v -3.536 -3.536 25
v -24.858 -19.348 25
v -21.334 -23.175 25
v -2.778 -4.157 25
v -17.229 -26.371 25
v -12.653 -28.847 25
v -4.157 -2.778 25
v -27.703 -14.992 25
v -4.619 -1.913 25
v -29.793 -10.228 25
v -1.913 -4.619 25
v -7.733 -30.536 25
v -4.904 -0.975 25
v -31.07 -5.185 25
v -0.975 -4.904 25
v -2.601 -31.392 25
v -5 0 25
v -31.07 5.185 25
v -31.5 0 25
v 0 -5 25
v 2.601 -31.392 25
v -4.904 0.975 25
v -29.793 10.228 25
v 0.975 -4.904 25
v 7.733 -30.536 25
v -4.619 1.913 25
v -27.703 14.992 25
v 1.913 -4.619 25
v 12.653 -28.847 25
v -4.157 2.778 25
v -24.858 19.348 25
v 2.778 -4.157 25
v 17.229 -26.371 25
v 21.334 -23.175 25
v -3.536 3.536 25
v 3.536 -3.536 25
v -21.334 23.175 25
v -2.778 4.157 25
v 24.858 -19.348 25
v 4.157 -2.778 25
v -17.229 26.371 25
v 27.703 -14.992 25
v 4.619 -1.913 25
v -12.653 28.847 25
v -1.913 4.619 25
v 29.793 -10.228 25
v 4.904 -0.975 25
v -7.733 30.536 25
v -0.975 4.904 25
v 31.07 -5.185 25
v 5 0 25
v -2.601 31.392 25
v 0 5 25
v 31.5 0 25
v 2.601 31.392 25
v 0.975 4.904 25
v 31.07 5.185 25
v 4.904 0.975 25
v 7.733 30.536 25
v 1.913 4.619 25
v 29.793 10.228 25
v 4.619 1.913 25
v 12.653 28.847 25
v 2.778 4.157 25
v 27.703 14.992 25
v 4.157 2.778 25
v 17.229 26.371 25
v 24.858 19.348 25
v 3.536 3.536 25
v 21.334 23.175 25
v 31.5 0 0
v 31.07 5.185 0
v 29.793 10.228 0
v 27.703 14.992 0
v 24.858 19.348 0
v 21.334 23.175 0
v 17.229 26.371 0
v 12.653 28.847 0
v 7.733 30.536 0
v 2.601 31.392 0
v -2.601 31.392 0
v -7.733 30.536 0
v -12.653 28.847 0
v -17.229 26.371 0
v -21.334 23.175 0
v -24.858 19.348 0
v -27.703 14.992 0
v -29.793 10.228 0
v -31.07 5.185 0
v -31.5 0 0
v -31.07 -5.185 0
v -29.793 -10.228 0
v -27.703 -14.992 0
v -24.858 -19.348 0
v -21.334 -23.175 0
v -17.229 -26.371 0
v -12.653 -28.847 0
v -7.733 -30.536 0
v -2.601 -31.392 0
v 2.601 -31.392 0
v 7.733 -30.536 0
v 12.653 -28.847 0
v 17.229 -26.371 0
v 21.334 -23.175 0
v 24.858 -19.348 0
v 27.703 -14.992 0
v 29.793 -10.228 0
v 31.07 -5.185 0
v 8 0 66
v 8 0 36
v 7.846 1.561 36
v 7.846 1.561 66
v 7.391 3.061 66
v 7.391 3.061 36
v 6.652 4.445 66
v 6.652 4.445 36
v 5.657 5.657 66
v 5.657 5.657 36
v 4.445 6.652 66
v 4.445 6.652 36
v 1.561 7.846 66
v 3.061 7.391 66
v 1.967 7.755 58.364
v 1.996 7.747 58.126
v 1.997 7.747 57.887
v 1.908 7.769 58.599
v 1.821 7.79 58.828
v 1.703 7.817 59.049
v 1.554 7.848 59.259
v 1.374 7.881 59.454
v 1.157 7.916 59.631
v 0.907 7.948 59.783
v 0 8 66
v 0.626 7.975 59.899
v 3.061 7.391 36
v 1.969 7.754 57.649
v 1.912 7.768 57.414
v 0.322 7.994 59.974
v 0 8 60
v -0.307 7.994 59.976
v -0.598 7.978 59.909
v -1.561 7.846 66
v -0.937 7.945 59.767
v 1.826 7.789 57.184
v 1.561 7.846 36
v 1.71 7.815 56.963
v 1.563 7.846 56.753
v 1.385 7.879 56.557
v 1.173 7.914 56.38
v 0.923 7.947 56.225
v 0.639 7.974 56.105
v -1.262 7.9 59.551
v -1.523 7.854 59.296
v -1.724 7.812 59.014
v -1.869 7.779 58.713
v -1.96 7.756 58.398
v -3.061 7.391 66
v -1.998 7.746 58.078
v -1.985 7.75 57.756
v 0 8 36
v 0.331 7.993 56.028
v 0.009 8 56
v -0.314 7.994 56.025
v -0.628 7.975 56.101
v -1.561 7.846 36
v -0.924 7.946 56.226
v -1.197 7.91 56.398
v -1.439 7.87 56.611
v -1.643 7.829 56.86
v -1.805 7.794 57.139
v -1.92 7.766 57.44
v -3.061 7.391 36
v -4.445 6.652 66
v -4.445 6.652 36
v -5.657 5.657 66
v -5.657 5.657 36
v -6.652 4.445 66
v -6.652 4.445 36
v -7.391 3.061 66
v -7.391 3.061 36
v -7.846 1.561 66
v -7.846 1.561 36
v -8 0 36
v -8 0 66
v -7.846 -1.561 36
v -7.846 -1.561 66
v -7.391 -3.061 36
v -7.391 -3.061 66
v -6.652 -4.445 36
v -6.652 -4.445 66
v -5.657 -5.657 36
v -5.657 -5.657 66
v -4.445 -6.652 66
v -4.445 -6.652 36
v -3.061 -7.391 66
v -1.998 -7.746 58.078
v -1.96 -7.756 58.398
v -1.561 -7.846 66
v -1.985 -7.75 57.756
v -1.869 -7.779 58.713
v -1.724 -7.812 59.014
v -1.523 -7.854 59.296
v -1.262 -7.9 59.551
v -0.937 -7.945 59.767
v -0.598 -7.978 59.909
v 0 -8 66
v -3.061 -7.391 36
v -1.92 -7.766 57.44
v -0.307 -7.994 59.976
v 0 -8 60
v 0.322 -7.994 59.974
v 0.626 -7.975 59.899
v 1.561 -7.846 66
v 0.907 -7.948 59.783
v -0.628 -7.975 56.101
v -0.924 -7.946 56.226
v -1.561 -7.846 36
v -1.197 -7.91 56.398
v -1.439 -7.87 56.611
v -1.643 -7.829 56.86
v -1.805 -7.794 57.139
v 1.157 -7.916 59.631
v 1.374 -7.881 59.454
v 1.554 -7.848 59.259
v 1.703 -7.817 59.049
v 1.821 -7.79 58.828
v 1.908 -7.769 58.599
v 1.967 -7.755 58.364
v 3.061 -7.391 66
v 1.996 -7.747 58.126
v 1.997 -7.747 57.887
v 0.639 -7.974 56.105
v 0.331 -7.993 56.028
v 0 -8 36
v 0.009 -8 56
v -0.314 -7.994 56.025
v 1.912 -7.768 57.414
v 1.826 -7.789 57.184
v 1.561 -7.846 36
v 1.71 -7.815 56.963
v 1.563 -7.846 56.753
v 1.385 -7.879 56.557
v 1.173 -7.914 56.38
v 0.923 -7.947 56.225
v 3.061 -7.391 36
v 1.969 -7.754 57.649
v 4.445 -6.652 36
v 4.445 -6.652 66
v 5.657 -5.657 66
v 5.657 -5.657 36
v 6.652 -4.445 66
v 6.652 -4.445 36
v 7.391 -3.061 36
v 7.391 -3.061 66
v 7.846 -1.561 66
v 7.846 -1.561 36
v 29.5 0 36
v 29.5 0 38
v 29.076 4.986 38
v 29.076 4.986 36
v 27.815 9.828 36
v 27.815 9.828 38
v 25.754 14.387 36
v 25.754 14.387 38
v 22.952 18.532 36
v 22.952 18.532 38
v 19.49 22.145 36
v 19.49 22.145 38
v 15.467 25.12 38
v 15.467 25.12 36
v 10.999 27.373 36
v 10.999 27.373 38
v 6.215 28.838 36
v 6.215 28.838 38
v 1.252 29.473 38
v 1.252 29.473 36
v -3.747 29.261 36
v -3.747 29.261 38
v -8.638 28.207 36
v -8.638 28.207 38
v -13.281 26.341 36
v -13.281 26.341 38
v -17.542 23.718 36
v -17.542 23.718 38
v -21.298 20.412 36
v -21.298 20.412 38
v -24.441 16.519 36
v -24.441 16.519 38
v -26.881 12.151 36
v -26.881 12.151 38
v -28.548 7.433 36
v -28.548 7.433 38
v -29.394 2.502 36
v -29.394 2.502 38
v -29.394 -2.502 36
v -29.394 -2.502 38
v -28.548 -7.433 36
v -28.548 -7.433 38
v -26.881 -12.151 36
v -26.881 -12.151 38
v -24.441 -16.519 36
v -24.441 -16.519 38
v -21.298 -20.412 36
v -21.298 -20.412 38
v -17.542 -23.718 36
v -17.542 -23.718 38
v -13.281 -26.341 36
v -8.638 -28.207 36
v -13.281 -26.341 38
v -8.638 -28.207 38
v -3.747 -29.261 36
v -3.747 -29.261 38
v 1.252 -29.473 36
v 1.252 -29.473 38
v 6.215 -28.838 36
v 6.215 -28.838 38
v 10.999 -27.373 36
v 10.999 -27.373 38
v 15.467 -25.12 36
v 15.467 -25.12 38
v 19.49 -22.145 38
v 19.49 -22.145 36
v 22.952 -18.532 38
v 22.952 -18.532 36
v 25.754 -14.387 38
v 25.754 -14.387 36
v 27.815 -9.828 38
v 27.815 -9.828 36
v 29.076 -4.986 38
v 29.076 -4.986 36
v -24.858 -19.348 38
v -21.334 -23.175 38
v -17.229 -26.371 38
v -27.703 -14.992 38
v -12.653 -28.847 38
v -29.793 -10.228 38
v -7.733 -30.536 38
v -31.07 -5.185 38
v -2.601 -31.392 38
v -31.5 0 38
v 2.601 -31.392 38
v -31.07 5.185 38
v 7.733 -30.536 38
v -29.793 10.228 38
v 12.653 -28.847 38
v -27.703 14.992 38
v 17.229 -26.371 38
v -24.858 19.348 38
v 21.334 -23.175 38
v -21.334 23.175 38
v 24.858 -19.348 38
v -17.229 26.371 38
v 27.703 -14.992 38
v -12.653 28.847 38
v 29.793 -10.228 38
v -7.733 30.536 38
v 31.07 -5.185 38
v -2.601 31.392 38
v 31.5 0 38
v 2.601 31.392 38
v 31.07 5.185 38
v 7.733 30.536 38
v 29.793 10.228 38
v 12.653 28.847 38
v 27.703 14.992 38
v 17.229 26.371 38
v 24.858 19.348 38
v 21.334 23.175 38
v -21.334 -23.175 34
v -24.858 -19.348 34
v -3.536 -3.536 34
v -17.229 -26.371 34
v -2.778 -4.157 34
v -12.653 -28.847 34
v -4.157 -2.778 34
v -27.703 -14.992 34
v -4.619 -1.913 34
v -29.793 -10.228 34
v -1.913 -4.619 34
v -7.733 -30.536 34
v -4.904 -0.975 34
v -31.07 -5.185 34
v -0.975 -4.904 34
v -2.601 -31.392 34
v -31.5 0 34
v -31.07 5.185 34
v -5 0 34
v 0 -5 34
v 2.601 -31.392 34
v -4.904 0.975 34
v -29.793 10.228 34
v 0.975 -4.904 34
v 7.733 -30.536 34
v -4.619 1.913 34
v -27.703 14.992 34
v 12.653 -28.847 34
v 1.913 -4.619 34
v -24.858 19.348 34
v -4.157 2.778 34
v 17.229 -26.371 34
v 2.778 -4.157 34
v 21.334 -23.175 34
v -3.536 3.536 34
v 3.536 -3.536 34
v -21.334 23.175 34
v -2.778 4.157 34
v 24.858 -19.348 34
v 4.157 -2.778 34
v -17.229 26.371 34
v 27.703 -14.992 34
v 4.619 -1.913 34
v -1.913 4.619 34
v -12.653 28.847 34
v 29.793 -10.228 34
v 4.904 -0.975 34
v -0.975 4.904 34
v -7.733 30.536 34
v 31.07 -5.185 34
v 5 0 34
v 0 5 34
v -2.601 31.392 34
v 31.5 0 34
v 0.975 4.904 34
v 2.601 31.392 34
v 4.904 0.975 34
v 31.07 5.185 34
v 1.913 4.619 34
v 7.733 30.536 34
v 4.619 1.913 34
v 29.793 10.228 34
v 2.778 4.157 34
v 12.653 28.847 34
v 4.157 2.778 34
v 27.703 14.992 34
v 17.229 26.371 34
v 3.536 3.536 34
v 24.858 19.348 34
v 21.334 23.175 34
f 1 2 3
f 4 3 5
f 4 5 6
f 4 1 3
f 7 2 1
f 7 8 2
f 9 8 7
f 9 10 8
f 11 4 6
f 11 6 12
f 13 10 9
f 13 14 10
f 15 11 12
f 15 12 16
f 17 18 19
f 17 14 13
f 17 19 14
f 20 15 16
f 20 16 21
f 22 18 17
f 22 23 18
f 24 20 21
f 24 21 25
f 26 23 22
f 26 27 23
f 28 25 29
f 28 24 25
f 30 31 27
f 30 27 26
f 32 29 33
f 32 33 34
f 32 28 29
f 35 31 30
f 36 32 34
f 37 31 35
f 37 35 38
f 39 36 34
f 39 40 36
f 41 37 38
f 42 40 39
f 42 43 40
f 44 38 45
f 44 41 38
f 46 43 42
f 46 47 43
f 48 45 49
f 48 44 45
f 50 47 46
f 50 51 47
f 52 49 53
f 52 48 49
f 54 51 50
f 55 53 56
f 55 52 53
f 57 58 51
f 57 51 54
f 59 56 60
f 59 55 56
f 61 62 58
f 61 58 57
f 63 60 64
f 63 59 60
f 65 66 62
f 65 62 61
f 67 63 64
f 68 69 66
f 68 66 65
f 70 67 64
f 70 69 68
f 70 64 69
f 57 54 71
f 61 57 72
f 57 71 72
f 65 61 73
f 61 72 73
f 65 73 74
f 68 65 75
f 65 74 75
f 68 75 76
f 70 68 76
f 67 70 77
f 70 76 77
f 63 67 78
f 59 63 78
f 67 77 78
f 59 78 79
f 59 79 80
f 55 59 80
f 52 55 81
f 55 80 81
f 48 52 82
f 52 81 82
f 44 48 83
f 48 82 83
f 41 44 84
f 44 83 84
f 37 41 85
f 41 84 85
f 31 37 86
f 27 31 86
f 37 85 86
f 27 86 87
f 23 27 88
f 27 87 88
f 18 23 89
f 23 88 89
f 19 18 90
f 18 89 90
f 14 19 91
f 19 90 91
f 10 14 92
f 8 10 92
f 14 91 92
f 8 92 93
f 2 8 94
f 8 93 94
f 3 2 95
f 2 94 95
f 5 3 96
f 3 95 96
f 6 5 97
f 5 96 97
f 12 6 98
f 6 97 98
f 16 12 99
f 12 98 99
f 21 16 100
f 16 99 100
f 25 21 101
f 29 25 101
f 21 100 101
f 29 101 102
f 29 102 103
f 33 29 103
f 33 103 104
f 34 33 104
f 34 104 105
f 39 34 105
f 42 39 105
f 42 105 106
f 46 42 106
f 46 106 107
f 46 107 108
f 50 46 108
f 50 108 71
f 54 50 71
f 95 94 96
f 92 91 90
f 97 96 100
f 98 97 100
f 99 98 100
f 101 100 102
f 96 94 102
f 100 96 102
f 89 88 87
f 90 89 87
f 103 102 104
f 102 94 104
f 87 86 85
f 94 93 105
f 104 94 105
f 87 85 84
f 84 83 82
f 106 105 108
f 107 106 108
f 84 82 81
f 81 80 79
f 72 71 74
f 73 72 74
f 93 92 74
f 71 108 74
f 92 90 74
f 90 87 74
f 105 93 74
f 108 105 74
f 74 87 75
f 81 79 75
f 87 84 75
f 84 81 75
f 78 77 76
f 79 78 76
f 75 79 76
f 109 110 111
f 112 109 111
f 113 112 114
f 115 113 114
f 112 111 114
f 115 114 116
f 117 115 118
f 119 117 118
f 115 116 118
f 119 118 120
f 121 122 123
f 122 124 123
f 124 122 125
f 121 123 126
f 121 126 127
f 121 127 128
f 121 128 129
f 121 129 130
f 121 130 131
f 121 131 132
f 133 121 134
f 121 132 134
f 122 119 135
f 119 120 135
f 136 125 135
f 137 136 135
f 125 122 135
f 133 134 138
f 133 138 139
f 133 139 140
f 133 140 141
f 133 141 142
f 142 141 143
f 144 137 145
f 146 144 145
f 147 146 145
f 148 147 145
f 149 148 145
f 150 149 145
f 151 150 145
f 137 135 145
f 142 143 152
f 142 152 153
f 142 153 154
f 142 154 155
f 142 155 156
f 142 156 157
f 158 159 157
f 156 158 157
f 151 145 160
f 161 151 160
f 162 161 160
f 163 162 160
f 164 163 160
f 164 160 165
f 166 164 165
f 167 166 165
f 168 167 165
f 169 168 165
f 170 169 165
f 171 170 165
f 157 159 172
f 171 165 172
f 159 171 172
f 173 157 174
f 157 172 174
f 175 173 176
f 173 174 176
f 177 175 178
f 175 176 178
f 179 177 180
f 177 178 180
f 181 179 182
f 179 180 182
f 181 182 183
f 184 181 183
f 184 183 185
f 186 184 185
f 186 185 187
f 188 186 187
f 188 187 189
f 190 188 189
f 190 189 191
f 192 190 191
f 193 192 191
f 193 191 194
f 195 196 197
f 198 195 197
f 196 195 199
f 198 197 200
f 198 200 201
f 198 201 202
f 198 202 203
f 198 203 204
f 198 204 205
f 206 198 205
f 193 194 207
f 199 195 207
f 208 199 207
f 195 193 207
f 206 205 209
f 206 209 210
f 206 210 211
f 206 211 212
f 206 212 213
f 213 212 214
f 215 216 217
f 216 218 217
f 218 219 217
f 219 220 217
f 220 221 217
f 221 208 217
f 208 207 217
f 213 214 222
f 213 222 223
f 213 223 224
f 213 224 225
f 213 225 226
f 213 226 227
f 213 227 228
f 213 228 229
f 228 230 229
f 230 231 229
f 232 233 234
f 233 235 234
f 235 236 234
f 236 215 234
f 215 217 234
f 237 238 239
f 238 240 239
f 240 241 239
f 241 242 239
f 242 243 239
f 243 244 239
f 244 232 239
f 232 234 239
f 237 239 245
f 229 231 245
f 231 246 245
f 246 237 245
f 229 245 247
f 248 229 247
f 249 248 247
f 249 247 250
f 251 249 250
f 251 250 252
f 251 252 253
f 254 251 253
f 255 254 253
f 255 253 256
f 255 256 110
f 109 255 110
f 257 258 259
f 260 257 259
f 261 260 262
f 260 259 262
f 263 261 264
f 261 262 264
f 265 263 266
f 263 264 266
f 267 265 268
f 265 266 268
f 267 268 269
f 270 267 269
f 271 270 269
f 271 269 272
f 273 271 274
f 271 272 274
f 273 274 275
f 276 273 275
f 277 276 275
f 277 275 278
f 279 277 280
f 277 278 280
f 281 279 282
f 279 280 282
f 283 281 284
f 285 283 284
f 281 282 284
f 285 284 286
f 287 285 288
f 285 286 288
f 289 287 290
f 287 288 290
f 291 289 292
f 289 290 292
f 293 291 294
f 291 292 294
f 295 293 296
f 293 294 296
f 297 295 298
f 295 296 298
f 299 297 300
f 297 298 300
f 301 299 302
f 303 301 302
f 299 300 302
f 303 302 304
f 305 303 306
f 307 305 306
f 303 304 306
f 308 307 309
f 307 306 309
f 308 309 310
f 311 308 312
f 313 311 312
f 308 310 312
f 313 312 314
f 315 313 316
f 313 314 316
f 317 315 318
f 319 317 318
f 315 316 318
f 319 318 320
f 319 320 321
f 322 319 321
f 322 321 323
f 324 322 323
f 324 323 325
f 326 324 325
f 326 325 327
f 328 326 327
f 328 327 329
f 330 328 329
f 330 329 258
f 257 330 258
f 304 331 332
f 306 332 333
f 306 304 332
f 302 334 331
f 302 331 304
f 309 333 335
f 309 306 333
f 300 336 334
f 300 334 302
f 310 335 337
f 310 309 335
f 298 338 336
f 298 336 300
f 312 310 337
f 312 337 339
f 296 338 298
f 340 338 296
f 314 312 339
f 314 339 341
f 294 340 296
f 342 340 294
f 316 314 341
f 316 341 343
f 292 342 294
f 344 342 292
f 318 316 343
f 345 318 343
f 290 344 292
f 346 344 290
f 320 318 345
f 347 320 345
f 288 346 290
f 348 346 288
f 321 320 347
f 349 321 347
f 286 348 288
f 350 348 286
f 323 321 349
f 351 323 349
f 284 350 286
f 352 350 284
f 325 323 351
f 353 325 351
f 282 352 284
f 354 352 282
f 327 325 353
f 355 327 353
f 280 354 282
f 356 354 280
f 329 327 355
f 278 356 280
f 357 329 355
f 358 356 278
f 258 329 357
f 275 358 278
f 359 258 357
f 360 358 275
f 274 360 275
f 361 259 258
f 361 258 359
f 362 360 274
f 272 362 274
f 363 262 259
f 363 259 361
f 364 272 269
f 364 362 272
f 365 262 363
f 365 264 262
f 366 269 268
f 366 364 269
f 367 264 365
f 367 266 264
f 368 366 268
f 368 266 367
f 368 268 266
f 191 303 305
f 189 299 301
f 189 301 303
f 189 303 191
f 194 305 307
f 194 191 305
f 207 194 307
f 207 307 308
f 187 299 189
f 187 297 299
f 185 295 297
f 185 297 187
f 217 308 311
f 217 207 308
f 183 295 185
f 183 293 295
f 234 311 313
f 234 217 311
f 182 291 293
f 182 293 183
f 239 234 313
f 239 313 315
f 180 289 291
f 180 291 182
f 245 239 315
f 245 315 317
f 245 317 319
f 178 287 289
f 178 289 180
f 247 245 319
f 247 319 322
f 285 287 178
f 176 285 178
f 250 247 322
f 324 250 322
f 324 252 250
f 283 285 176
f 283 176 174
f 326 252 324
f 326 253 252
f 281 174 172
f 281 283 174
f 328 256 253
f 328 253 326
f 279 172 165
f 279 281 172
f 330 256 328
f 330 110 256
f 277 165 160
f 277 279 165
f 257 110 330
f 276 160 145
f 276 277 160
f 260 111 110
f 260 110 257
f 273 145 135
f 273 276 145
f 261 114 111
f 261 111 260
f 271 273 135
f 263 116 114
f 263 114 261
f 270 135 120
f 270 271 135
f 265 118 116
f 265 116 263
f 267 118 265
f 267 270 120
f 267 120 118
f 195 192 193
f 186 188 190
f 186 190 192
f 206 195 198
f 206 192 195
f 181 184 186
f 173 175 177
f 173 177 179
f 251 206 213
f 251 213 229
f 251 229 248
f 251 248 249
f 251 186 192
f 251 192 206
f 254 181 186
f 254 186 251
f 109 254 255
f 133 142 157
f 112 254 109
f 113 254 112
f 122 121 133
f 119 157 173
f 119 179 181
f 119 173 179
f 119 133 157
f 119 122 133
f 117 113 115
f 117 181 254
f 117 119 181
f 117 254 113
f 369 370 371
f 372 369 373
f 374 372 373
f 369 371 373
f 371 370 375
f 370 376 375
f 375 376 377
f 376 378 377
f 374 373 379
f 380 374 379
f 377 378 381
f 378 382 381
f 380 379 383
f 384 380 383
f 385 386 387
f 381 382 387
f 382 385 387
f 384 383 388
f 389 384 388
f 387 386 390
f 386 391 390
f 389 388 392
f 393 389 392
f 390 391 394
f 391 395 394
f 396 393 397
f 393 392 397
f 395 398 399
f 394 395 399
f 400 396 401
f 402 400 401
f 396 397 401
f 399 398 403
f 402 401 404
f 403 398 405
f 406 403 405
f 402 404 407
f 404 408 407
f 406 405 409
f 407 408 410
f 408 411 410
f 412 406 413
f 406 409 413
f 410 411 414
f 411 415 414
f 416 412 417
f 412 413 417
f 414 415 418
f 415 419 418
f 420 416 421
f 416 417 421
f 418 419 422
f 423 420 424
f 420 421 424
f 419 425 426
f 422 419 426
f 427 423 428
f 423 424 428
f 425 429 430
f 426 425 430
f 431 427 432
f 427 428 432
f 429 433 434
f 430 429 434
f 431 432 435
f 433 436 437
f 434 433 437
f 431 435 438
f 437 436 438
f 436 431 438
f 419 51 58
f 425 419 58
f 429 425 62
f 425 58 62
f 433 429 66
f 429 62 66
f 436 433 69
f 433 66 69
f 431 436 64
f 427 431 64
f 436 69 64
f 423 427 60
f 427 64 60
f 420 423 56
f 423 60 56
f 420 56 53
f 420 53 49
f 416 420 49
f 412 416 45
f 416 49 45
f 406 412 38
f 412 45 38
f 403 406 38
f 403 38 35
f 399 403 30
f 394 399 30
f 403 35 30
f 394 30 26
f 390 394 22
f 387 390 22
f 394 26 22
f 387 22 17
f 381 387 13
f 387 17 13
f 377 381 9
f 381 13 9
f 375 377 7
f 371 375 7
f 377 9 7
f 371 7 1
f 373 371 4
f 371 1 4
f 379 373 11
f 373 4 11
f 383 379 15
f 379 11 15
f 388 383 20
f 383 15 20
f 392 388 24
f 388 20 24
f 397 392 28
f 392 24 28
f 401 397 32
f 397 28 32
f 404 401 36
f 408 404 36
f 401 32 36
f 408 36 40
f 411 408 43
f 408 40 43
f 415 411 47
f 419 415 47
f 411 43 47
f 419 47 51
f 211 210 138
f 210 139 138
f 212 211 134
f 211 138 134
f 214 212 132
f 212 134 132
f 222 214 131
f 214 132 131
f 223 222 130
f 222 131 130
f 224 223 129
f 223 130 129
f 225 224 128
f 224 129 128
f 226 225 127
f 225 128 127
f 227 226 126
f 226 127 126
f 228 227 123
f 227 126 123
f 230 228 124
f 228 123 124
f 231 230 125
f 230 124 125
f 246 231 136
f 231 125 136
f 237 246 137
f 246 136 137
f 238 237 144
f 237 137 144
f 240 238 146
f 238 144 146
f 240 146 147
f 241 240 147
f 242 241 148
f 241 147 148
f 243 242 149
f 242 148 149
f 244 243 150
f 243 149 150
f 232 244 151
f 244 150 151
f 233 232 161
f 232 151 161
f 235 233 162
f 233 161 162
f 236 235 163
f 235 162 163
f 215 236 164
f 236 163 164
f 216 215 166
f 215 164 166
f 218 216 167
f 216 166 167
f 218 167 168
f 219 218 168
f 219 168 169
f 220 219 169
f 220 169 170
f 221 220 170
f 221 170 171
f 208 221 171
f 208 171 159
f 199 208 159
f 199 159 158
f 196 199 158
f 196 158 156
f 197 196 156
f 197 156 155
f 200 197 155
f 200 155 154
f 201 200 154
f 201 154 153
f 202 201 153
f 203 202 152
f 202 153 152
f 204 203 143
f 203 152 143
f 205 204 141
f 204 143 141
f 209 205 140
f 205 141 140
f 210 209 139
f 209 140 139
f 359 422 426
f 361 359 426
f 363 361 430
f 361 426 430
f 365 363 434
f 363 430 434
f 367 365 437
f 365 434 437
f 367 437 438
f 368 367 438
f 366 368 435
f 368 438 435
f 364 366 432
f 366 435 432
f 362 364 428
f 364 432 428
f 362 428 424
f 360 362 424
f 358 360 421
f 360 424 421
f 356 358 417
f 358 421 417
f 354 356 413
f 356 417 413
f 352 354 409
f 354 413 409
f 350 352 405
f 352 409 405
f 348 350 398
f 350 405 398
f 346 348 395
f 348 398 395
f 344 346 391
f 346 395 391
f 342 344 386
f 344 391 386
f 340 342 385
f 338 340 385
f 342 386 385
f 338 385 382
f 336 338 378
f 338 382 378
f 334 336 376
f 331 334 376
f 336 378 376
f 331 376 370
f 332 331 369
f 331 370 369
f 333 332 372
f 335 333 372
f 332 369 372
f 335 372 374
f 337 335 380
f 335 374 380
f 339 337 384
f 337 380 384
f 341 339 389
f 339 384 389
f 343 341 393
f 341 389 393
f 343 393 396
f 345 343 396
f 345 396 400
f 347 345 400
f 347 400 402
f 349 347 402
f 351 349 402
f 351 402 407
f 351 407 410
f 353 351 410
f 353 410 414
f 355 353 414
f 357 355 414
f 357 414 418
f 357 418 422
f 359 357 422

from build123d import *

# Parameters (mm, degrees)
SKETCH_1_R          = 31.5
EXTRUDE_1_DEPTH     = 25
SKETCH_2_R          = 5
EXTRUDE_2_DEPTH     = 9
SKETCH_3_R          = 31.5
EXTRUDE_3_DEPTH     = 4
SKETCH_4_R          = 29.5
CUT_EXTRUDE_1_DEPTH = 2
SKETCH_5_R          = 8
EXTRUDE_4_DEPTH     = 30
SKETCH_6_R          = 2
CUT_EXTRUDE_2_DEPTH = 20


with BuildPart() as part:
    # 草图1 → 凸台-拉伸1 (new body)
    with BuildSketch(Plane.XY):
        Circle(SKETCH_1_R)
    extrude(amount=EXTRUDE_1_DEPTH)

    # 草图2 → 凸台-拉伸2 (add)
    with BuildSketch(Plane.XY.offset(25)):
        Circle(SKETCH_2_R)
    extrude(amount=EXTRUDE_2_DEPTH)

    # 草图3 → 凸台-拉伸3 (add)
    with BuildSketch(Plane.XY.offset(34)):
        Circle(SKETCH_3_R)
    extrude(amount=EXTRUDE_3_DEPTH)

    # 草图4 → 切除-拉伸1 (cut)
    with BuildSketch(Plane.XY.offset(38)):
        Circle(SKETCH_4_R)
    extrude(amount=-CUT_EXTRUDE_1_DEPTH, mode=Mode.SUBTRACT)

    # 草图5 → 凸台-拉伸4 (add)
    with BuildSketch(Plane.XY.offset(36)):
        Circle(SKETCH_5_R)
    extrude(amount=EXTRUDE_4_DEPTH)

    # 草图6 → 切除-拉伸2 (cut, symmetric)
    with BuildSketch(Plane(origin=(0, 0, 0), x_dir=(1, 0, 0), z_dir=(0, 1, 0))):
        with Locations(Location((0, -58, 0), (0, 0, 270))):
            Circle(SKETCH_6_R)
    extrude(amount=CUT_EXTRUDE_2_DEPTH, both=True, mode=Mode.SUBTRACT)


solid = part.part
